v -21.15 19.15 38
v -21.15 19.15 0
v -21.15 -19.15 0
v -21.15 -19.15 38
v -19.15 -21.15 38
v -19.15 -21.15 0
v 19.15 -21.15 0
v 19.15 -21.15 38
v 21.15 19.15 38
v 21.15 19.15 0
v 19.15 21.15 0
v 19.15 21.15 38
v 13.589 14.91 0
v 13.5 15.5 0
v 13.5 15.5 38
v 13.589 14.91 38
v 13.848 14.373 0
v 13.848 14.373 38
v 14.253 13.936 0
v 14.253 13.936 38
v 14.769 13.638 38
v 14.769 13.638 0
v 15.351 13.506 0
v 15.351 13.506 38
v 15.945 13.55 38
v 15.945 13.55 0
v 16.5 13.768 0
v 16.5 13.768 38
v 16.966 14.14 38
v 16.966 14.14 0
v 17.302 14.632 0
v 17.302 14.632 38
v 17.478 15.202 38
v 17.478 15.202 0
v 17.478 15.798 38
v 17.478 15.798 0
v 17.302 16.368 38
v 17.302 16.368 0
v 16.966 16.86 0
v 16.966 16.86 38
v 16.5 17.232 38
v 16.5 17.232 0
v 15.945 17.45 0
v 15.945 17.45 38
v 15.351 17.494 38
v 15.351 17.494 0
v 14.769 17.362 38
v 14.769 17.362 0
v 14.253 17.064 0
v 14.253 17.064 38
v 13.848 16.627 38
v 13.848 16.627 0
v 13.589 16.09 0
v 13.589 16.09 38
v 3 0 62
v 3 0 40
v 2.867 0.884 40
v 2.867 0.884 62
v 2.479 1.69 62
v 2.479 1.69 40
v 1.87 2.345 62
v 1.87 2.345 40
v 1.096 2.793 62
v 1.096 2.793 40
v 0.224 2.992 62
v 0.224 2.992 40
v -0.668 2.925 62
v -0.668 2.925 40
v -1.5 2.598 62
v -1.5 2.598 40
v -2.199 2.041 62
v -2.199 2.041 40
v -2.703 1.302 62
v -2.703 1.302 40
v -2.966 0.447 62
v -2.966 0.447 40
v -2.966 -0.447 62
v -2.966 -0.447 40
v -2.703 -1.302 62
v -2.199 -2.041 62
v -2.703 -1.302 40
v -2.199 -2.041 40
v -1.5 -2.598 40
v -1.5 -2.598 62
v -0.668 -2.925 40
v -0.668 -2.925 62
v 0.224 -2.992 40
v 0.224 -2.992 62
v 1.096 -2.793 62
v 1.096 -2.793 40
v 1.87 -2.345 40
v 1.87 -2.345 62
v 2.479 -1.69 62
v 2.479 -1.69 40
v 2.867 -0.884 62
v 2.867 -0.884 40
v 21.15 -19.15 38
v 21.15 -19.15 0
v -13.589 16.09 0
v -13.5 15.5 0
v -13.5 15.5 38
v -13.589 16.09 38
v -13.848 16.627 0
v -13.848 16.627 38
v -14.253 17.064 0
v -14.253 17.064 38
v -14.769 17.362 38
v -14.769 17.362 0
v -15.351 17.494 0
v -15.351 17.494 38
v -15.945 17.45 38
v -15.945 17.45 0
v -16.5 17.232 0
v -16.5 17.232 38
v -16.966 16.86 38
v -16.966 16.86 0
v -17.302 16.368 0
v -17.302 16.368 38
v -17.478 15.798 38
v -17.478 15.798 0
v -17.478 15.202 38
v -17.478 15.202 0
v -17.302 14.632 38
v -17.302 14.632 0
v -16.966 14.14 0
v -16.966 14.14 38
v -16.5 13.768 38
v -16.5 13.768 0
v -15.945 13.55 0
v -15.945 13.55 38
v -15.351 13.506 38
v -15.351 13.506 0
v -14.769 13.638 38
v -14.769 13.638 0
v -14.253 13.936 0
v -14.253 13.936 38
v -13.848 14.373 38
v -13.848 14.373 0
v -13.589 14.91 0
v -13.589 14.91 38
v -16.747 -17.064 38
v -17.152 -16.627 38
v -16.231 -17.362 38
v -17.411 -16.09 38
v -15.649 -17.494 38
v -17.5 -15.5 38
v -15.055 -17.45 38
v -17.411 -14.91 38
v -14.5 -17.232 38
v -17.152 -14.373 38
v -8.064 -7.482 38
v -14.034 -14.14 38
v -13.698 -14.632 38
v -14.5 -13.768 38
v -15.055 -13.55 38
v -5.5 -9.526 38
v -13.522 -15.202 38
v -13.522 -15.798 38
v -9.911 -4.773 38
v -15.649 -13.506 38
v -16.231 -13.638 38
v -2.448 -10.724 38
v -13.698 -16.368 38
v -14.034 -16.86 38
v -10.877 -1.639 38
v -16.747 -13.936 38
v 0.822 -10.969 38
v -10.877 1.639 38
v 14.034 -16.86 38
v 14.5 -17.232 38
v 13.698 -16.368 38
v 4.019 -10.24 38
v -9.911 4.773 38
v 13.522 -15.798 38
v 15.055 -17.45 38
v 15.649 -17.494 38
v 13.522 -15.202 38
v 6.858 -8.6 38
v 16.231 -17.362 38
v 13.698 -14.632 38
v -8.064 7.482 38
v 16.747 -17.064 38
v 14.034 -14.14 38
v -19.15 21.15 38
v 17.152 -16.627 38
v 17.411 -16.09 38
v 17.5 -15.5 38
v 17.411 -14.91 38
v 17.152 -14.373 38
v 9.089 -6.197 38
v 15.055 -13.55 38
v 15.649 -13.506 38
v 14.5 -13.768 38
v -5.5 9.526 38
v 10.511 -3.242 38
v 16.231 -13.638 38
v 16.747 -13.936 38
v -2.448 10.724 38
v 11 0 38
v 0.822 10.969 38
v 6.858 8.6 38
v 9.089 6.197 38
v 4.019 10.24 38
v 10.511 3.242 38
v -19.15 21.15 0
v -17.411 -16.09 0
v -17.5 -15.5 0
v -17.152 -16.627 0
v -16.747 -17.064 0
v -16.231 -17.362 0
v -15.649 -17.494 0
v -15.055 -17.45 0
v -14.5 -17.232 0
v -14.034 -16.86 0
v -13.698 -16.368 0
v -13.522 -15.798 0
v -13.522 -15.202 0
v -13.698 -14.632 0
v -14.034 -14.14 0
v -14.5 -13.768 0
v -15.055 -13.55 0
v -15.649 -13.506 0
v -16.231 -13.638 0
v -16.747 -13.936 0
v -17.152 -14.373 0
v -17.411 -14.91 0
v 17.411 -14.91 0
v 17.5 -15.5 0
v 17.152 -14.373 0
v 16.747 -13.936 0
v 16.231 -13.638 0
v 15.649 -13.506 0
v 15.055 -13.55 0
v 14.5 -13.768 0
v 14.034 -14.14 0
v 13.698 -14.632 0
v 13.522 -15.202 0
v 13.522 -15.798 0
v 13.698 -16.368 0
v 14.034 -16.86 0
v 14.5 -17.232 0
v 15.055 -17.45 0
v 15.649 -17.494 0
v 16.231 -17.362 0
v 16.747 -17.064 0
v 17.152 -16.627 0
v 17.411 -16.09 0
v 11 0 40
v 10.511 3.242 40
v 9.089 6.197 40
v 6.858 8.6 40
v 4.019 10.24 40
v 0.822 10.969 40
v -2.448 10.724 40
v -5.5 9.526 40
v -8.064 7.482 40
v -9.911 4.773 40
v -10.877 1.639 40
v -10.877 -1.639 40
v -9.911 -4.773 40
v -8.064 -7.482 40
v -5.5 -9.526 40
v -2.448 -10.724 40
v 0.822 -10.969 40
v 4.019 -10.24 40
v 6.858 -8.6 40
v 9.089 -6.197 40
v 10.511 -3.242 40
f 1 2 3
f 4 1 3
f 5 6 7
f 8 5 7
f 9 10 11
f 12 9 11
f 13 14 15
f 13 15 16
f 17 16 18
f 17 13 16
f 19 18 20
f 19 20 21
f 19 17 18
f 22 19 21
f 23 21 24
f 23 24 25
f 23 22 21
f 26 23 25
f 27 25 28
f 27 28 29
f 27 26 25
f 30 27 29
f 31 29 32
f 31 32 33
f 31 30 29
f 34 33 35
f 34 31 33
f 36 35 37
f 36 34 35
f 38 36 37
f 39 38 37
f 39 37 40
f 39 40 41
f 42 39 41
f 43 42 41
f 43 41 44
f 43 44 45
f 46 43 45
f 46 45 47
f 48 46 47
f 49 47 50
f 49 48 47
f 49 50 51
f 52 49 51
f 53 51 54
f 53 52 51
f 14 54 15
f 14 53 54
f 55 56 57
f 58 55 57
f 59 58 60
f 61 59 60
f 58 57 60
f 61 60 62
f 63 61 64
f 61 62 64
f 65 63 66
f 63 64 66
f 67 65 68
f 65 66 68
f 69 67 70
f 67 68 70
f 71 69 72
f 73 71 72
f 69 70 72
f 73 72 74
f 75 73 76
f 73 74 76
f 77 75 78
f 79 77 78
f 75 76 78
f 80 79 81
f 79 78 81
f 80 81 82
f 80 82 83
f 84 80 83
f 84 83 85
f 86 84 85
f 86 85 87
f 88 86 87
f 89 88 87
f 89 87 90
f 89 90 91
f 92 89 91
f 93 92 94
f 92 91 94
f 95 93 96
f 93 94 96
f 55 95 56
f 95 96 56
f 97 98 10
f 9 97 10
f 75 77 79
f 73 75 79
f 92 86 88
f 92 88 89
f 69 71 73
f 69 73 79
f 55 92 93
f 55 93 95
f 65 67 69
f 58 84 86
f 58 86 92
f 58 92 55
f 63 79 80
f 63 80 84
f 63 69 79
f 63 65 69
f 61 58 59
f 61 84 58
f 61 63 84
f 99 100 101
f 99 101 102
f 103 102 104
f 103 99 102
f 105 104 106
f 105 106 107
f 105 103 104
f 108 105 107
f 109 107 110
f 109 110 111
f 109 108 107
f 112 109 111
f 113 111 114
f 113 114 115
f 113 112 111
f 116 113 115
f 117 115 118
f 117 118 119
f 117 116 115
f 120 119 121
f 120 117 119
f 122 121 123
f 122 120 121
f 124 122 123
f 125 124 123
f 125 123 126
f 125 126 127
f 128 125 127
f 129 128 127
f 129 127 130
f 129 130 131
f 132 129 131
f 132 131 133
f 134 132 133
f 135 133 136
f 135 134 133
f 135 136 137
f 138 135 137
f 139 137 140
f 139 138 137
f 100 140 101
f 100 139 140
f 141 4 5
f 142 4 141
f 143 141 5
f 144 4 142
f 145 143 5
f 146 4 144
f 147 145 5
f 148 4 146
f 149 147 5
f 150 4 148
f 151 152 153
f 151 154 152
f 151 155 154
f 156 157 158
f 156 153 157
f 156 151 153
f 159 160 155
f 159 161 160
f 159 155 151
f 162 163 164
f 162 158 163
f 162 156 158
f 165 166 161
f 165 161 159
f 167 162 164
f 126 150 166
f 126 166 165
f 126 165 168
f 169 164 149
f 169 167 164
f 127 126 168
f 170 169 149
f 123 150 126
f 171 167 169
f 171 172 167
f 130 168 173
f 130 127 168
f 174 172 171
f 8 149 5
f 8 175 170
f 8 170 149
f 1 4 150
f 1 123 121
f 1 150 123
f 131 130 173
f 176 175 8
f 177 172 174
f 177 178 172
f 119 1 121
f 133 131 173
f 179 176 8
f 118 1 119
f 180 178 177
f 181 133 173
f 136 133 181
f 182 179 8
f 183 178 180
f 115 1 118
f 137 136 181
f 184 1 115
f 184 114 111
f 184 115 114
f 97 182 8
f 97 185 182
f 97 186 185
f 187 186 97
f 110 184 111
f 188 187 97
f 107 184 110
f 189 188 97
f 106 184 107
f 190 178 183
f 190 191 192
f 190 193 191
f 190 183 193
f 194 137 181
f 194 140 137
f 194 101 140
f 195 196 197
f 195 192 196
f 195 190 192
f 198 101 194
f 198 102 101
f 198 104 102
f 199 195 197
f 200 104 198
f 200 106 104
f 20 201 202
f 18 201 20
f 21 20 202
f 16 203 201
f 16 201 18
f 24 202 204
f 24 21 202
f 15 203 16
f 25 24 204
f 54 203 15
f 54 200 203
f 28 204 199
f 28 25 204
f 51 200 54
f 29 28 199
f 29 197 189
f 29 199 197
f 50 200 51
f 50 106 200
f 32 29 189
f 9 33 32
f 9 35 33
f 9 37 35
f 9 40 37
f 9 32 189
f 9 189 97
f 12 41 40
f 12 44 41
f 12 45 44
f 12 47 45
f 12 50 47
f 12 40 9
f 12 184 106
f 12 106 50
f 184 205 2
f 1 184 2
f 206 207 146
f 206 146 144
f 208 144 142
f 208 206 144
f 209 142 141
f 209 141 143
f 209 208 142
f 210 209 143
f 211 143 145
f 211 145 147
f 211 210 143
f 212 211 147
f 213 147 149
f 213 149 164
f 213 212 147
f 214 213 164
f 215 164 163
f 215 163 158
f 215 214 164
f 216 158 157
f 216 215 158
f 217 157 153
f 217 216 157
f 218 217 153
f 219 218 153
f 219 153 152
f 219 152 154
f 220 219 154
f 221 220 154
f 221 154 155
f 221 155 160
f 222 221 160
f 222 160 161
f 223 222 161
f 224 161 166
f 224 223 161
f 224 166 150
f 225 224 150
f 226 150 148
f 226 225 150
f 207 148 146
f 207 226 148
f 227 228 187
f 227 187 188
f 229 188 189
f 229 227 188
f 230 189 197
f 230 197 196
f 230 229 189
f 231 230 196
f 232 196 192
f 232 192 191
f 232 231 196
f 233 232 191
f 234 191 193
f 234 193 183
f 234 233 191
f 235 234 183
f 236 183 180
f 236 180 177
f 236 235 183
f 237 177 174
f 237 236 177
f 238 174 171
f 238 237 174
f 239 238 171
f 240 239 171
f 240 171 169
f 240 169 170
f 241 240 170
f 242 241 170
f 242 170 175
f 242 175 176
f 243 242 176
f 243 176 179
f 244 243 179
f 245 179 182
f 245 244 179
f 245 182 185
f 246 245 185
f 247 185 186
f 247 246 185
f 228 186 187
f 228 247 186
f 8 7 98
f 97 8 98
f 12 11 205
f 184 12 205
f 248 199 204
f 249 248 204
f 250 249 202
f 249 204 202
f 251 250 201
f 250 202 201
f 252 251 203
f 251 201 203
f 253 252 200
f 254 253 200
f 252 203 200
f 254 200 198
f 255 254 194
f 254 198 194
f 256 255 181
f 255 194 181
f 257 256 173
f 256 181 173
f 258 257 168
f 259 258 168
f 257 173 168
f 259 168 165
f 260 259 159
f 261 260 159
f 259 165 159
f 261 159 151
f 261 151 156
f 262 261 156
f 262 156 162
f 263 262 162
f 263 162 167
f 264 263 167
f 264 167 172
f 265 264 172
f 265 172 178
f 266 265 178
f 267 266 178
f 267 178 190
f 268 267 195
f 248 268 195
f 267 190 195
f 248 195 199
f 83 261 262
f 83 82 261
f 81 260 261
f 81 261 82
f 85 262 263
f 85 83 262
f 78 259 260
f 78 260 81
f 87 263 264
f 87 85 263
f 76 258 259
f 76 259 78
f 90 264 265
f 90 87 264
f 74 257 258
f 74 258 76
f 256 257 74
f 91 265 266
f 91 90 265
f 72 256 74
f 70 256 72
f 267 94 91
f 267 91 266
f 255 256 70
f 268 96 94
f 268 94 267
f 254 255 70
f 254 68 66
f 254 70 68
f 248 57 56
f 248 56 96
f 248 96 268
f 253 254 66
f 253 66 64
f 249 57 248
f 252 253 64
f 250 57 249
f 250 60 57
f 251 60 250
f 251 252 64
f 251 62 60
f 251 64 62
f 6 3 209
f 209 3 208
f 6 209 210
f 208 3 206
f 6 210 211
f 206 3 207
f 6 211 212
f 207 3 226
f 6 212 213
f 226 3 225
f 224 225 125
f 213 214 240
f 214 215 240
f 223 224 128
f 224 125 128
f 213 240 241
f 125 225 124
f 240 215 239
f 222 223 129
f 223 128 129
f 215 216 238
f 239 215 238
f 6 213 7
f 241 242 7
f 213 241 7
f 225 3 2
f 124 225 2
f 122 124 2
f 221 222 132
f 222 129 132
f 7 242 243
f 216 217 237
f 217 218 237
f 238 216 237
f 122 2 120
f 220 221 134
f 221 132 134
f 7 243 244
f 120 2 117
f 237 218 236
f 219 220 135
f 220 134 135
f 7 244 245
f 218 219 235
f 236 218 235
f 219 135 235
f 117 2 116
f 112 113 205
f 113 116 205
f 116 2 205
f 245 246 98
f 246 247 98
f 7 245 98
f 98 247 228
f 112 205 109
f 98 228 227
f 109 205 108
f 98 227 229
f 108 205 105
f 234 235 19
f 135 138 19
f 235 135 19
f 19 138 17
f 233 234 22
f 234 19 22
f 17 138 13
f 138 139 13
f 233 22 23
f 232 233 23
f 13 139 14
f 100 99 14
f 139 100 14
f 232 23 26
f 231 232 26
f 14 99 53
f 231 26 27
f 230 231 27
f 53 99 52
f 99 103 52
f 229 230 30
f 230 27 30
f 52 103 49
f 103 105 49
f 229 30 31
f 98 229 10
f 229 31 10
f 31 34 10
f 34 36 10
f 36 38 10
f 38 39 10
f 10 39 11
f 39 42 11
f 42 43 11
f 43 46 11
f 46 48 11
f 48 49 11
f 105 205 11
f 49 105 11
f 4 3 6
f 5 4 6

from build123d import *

# Parameters (mm, degrees)
ESQUISSE1_R              = 2
BASE_RECTANGULAIRE_DEPTH = 38
ESQUISSE2_R              = 11
BOSS_DISQUE_DEPTH        = 2
ESQUISSE3_R              = 3
BOSS_AXE_DEPTH           = 22


with BuildPart() as part:
    # Esquisse1 → BASE RECTANGULAIRE (new body)
    with BuildSketch(Plane.XY):
        Polygon((-19.15, -21.15), (19.15, -21.15), (21.15, -19.15), (21.15, 19.15), (19.15, 21.15), (-19.15, 21.15), (-21.15, 19.15), (-21.15, -19.15), align=None)
        with Locations((-15.5, 15.5)):
            Circle(ESQUISSE1_R, mode=Mode.SUBTRACT)
        with Locations(Location((15.5, 15.5, 0), (0, 0, 180))):
            Circle(ESQUISSE1_R, mode=Mode.SUBTRACT)
        with Locations((15.5, -15.5)):
            Circle(ESQUISSE1_R, mode=Mode.SUBTRACT)
        with Locations(Location((-15.5, -15.5, 0), (0, 0, 180))):
            Circle(ESQUISSE1_R, mode=Mode.SUBTRACT)
    extrude(amount=BASE_RECTANGULAIRE_DEPTH)

    # Esquisse2 → BOSS DISQUE (add)
    with BuildSketch(Plane.XY.offset(38)):
        Circle(ESQUISSE2_R)
    extrude(amount=BOSS_DISQUE_DEPTH)

    # Esquisse3 → BOSS AXE (add)
    with BuildSketch(Plane.XY.offset(40)):
        Circle(ESQUISSE3_R)
    extrude(amount=BOSS_AXE_DEPTH)


solid = part.part
